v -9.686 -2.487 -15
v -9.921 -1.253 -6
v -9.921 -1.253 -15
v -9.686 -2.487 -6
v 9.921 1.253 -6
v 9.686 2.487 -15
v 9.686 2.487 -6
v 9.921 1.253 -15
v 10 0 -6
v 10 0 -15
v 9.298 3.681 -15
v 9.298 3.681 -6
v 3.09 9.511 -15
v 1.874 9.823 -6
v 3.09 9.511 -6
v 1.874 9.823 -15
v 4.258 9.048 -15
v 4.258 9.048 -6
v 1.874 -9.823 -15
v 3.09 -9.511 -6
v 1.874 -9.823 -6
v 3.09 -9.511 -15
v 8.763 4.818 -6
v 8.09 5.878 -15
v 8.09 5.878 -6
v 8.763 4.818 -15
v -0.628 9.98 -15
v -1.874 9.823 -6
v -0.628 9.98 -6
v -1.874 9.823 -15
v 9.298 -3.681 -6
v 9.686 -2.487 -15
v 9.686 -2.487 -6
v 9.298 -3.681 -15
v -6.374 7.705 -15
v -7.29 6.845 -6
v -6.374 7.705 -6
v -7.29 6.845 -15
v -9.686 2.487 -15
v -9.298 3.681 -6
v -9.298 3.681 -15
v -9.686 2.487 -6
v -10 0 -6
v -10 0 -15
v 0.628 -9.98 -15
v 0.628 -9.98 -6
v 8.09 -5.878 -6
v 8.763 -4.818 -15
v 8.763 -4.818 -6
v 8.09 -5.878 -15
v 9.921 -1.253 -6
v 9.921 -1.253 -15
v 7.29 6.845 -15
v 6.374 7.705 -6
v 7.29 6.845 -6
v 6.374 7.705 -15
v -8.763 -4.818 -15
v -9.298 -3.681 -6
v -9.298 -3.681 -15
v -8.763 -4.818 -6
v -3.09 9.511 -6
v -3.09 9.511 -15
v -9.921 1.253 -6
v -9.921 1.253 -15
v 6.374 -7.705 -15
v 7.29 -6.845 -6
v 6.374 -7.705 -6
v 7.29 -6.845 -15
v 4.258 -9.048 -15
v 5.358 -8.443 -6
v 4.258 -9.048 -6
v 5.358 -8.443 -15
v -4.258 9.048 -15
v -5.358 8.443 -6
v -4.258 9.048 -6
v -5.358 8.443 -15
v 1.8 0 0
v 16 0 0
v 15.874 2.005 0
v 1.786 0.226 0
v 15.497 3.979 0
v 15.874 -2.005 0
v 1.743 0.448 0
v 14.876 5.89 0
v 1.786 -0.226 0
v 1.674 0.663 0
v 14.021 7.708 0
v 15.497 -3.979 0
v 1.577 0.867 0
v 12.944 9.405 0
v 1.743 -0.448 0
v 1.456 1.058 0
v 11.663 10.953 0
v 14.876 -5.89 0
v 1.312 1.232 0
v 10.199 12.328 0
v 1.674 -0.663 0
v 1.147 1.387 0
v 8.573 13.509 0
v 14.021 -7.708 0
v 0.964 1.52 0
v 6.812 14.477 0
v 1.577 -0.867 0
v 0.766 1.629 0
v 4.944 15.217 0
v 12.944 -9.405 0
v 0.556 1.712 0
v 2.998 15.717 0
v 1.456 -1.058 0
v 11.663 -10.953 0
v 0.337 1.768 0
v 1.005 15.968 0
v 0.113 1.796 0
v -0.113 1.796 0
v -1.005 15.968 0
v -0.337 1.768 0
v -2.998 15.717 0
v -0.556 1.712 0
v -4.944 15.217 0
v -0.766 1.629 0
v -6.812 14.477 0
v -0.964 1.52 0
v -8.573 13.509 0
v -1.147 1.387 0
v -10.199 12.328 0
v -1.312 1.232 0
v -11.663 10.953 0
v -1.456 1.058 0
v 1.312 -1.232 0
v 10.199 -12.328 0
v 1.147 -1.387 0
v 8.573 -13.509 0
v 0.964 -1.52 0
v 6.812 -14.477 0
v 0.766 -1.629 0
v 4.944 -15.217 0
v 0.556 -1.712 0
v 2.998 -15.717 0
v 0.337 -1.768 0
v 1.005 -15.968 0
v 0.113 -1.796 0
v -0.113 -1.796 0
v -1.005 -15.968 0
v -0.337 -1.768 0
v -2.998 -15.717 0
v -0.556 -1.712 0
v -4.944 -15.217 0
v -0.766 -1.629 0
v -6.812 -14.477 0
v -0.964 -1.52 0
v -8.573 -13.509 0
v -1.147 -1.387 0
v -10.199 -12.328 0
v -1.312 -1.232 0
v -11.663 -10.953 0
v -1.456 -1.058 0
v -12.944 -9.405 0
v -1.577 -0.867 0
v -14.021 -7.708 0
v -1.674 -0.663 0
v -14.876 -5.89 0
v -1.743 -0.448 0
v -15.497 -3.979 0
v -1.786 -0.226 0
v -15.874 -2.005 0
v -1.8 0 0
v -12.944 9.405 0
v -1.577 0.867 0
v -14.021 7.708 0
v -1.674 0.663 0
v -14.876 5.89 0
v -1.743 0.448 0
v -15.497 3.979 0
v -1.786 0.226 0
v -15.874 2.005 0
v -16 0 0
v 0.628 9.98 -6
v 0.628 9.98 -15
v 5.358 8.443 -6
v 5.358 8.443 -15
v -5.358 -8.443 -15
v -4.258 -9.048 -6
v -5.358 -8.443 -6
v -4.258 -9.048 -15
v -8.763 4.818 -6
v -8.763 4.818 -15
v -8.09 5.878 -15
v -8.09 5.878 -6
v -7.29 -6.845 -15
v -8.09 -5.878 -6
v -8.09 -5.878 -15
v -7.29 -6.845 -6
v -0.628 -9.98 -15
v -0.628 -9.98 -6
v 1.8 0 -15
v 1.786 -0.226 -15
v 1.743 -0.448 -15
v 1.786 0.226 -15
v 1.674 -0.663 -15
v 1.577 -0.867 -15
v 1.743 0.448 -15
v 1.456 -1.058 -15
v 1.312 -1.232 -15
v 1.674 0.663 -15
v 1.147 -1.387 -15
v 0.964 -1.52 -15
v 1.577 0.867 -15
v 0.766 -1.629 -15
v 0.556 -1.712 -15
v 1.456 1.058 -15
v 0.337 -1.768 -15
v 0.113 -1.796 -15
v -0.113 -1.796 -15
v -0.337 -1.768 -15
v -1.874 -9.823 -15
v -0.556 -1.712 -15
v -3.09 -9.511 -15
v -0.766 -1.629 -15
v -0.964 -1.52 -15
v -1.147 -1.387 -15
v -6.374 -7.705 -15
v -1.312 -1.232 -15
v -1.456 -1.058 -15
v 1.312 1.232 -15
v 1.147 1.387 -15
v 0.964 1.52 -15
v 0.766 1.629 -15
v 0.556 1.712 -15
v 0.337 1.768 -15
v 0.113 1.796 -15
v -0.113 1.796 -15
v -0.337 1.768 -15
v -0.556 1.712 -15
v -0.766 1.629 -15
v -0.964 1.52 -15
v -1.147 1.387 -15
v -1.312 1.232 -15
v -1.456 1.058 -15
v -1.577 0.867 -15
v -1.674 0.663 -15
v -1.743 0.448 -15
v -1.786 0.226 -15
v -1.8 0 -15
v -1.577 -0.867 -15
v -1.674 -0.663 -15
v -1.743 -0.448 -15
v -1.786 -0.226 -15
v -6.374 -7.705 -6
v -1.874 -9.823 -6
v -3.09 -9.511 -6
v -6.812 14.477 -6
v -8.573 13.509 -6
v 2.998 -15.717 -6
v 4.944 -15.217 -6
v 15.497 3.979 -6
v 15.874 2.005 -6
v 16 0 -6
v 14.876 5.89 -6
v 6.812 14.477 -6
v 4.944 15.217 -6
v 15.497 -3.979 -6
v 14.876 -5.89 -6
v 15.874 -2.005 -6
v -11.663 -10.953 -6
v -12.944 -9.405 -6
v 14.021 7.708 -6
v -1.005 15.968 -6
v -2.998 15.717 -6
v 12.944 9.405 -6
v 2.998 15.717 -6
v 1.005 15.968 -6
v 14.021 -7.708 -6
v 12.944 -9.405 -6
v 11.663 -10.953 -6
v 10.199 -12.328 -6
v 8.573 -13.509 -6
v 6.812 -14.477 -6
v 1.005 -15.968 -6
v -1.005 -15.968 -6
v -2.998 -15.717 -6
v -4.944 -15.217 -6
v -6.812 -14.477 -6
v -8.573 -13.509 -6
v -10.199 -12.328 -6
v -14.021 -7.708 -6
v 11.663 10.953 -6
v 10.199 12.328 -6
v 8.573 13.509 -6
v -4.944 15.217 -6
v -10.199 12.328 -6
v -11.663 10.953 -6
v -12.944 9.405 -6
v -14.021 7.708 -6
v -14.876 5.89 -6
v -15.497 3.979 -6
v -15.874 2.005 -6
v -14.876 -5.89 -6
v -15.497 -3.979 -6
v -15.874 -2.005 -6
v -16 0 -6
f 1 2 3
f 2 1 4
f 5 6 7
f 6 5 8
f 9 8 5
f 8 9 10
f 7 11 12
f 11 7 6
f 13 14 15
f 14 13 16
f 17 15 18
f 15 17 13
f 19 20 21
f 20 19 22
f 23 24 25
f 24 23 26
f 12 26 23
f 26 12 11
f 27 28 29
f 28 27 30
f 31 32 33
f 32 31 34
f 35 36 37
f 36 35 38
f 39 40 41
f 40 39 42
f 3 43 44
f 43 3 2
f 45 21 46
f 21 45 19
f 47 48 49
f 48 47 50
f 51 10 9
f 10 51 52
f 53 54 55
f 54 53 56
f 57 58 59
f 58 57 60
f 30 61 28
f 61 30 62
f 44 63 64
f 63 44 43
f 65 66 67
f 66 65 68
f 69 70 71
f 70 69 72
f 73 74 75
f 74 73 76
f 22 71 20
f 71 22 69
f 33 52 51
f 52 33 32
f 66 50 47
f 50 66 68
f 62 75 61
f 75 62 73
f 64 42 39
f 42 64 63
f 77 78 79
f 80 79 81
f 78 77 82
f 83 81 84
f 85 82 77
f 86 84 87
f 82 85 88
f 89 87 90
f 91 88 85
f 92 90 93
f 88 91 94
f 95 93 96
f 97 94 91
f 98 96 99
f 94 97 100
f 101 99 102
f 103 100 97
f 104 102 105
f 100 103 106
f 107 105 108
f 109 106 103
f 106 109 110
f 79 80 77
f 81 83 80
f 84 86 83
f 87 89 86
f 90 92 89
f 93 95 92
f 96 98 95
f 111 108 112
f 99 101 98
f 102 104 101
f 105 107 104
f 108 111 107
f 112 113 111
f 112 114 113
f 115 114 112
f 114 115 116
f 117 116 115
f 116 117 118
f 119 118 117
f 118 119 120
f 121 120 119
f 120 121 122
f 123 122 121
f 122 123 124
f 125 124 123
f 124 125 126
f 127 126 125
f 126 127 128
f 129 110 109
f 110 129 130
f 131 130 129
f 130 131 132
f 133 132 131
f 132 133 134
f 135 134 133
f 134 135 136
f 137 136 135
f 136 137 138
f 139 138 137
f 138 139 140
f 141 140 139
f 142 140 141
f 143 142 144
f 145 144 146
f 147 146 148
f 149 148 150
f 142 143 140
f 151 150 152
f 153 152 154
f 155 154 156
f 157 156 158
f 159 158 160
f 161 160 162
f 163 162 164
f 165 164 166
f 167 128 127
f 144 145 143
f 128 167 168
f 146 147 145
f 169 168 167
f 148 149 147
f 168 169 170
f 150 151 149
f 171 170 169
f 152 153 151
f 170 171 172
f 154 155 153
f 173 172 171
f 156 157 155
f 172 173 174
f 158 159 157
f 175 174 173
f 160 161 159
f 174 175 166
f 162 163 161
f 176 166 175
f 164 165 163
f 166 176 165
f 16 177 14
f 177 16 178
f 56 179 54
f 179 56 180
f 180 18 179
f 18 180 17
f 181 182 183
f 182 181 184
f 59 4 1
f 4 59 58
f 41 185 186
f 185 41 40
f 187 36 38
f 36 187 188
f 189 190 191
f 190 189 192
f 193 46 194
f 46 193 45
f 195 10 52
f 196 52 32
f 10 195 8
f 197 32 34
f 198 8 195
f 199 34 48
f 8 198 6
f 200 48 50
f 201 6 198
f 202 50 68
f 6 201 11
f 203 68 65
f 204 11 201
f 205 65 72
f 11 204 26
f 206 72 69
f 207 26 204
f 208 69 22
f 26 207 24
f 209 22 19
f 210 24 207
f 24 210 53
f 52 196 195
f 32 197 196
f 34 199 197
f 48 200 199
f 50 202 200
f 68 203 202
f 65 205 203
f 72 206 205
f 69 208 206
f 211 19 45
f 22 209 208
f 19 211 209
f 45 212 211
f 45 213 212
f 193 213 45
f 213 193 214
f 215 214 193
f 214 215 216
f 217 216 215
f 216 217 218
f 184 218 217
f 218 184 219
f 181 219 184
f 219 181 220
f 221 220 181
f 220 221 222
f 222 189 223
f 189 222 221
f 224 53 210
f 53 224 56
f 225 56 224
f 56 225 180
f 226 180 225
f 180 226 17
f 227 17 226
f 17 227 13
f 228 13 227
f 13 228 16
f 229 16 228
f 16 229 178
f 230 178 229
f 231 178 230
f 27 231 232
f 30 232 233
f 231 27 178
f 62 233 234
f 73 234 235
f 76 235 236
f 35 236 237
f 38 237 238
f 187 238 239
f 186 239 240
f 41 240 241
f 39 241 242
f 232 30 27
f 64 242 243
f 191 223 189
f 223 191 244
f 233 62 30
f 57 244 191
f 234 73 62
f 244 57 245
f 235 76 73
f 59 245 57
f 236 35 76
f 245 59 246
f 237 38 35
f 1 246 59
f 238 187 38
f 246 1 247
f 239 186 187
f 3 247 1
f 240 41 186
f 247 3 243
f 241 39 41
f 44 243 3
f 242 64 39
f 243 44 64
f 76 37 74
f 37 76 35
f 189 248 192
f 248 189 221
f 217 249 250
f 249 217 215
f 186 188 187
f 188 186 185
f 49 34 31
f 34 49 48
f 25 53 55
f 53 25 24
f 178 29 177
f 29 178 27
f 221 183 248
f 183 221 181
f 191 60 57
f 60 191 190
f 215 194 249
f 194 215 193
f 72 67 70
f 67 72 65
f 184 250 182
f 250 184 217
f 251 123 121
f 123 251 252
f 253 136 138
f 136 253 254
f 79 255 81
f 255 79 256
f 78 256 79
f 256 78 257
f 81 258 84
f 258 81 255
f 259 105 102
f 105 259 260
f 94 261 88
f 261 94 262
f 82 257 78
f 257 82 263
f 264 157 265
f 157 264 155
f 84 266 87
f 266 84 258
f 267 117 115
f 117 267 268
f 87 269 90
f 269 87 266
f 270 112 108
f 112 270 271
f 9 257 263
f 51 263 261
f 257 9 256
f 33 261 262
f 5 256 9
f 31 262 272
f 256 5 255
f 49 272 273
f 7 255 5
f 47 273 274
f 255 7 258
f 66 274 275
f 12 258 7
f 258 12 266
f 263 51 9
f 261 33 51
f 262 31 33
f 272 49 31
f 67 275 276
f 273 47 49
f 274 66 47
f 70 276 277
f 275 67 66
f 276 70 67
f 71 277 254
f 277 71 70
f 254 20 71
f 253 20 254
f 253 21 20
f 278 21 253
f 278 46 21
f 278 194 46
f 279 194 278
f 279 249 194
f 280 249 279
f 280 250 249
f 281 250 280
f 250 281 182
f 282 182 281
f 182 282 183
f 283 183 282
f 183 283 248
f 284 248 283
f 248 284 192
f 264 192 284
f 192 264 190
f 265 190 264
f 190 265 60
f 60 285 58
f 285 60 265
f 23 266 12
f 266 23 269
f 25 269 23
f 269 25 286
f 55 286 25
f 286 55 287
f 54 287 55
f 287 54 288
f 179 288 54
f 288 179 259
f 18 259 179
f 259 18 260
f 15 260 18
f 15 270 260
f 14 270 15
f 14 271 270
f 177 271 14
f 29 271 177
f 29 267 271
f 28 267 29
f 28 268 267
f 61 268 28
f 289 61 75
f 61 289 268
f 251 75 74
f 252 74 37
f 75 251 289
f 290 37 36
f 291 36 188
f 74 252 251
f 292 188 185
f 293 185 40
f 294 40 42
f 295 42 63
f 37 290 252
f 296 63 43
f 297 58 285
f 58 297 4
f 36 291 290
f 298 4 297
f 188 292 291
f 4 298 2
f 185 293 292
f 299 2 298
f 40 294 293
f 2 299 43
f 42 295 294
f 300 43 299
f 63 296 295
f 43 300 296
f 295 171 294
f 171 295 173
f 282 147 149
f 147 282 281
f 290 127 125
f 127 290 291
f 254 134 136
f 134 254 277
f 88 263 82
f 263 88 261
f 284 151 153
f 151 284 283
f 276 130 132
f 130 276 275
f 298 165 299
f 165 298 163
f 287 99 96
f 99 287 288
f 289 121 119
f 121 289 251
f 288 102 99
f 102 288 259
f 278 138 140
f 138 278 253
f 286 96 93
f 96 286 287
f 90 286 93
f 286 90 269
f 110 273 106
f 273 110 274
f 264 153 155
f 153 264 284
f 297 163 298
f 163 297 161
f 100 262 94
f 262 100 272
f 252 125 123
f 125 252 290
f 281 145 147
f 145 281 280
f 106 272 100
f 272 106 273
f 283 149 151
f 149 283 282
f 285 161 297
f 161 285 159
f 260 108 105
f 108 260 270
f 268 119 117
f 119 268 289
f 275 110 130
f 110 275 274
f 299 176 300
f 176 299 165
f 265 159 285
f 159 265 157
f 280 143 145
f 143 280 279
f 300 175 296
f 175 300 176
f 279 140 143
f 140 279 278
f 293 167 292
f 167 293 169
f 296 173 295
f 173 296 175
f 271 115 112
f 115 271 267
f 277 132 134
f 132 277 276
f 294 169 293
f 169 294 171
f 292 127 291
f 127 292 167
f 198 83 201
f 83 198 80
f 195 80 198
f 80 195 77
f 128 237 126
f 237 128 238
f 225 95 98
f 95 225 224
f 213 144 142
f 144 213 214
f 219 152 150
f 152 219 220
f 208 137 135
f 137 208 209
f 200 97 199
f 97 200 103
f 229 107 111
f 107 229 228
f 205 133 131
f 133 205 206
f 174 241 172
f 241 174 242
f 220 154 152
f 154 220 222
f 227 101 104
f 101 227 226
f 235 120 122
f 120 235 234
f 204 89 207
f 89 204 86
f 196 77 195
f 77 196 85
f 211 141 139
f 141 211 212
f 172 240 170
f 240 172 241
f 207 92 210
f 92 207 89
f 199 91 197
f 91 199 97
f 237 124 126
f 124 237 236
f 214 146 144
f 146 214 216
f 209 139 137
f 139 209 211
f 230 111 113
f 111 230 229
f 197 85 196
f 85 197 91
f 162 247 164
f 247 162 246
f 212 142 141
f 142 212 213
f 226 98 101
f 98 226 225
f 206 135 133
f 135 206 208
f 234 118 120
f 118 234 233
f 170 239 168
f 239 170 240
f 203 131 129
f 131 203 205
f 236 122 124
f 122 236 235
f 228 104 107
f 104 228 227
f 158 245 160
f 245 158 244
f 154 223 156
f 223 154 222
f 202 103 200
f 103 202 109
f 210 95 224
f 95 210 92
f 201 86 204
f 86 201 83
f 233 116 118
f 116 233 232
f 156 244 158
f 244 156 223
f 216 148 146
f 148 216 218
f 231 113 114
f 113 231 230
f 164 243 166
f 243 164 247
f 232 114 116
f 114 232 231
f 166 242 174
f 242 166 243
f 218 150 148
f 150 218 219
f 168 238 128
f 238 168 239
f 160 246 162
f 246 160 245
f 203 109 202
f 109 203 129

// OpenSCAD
$fn = 50;


difference() {
	union() {
		translate(v = [0, 0, -15.0000000000]) {
			cylinder(h = 15, r = 10.0000000000);
		}
		translate(v = [0, 0, -6.0000000000]) {
			cylinder(h = 6, r = 16.0000000000);
		}
	}
	union() {
		#translate(v = [0, 0, -15]) {
			cylinder(h = 15, r = 1.8000000000);
		}
	}
}
